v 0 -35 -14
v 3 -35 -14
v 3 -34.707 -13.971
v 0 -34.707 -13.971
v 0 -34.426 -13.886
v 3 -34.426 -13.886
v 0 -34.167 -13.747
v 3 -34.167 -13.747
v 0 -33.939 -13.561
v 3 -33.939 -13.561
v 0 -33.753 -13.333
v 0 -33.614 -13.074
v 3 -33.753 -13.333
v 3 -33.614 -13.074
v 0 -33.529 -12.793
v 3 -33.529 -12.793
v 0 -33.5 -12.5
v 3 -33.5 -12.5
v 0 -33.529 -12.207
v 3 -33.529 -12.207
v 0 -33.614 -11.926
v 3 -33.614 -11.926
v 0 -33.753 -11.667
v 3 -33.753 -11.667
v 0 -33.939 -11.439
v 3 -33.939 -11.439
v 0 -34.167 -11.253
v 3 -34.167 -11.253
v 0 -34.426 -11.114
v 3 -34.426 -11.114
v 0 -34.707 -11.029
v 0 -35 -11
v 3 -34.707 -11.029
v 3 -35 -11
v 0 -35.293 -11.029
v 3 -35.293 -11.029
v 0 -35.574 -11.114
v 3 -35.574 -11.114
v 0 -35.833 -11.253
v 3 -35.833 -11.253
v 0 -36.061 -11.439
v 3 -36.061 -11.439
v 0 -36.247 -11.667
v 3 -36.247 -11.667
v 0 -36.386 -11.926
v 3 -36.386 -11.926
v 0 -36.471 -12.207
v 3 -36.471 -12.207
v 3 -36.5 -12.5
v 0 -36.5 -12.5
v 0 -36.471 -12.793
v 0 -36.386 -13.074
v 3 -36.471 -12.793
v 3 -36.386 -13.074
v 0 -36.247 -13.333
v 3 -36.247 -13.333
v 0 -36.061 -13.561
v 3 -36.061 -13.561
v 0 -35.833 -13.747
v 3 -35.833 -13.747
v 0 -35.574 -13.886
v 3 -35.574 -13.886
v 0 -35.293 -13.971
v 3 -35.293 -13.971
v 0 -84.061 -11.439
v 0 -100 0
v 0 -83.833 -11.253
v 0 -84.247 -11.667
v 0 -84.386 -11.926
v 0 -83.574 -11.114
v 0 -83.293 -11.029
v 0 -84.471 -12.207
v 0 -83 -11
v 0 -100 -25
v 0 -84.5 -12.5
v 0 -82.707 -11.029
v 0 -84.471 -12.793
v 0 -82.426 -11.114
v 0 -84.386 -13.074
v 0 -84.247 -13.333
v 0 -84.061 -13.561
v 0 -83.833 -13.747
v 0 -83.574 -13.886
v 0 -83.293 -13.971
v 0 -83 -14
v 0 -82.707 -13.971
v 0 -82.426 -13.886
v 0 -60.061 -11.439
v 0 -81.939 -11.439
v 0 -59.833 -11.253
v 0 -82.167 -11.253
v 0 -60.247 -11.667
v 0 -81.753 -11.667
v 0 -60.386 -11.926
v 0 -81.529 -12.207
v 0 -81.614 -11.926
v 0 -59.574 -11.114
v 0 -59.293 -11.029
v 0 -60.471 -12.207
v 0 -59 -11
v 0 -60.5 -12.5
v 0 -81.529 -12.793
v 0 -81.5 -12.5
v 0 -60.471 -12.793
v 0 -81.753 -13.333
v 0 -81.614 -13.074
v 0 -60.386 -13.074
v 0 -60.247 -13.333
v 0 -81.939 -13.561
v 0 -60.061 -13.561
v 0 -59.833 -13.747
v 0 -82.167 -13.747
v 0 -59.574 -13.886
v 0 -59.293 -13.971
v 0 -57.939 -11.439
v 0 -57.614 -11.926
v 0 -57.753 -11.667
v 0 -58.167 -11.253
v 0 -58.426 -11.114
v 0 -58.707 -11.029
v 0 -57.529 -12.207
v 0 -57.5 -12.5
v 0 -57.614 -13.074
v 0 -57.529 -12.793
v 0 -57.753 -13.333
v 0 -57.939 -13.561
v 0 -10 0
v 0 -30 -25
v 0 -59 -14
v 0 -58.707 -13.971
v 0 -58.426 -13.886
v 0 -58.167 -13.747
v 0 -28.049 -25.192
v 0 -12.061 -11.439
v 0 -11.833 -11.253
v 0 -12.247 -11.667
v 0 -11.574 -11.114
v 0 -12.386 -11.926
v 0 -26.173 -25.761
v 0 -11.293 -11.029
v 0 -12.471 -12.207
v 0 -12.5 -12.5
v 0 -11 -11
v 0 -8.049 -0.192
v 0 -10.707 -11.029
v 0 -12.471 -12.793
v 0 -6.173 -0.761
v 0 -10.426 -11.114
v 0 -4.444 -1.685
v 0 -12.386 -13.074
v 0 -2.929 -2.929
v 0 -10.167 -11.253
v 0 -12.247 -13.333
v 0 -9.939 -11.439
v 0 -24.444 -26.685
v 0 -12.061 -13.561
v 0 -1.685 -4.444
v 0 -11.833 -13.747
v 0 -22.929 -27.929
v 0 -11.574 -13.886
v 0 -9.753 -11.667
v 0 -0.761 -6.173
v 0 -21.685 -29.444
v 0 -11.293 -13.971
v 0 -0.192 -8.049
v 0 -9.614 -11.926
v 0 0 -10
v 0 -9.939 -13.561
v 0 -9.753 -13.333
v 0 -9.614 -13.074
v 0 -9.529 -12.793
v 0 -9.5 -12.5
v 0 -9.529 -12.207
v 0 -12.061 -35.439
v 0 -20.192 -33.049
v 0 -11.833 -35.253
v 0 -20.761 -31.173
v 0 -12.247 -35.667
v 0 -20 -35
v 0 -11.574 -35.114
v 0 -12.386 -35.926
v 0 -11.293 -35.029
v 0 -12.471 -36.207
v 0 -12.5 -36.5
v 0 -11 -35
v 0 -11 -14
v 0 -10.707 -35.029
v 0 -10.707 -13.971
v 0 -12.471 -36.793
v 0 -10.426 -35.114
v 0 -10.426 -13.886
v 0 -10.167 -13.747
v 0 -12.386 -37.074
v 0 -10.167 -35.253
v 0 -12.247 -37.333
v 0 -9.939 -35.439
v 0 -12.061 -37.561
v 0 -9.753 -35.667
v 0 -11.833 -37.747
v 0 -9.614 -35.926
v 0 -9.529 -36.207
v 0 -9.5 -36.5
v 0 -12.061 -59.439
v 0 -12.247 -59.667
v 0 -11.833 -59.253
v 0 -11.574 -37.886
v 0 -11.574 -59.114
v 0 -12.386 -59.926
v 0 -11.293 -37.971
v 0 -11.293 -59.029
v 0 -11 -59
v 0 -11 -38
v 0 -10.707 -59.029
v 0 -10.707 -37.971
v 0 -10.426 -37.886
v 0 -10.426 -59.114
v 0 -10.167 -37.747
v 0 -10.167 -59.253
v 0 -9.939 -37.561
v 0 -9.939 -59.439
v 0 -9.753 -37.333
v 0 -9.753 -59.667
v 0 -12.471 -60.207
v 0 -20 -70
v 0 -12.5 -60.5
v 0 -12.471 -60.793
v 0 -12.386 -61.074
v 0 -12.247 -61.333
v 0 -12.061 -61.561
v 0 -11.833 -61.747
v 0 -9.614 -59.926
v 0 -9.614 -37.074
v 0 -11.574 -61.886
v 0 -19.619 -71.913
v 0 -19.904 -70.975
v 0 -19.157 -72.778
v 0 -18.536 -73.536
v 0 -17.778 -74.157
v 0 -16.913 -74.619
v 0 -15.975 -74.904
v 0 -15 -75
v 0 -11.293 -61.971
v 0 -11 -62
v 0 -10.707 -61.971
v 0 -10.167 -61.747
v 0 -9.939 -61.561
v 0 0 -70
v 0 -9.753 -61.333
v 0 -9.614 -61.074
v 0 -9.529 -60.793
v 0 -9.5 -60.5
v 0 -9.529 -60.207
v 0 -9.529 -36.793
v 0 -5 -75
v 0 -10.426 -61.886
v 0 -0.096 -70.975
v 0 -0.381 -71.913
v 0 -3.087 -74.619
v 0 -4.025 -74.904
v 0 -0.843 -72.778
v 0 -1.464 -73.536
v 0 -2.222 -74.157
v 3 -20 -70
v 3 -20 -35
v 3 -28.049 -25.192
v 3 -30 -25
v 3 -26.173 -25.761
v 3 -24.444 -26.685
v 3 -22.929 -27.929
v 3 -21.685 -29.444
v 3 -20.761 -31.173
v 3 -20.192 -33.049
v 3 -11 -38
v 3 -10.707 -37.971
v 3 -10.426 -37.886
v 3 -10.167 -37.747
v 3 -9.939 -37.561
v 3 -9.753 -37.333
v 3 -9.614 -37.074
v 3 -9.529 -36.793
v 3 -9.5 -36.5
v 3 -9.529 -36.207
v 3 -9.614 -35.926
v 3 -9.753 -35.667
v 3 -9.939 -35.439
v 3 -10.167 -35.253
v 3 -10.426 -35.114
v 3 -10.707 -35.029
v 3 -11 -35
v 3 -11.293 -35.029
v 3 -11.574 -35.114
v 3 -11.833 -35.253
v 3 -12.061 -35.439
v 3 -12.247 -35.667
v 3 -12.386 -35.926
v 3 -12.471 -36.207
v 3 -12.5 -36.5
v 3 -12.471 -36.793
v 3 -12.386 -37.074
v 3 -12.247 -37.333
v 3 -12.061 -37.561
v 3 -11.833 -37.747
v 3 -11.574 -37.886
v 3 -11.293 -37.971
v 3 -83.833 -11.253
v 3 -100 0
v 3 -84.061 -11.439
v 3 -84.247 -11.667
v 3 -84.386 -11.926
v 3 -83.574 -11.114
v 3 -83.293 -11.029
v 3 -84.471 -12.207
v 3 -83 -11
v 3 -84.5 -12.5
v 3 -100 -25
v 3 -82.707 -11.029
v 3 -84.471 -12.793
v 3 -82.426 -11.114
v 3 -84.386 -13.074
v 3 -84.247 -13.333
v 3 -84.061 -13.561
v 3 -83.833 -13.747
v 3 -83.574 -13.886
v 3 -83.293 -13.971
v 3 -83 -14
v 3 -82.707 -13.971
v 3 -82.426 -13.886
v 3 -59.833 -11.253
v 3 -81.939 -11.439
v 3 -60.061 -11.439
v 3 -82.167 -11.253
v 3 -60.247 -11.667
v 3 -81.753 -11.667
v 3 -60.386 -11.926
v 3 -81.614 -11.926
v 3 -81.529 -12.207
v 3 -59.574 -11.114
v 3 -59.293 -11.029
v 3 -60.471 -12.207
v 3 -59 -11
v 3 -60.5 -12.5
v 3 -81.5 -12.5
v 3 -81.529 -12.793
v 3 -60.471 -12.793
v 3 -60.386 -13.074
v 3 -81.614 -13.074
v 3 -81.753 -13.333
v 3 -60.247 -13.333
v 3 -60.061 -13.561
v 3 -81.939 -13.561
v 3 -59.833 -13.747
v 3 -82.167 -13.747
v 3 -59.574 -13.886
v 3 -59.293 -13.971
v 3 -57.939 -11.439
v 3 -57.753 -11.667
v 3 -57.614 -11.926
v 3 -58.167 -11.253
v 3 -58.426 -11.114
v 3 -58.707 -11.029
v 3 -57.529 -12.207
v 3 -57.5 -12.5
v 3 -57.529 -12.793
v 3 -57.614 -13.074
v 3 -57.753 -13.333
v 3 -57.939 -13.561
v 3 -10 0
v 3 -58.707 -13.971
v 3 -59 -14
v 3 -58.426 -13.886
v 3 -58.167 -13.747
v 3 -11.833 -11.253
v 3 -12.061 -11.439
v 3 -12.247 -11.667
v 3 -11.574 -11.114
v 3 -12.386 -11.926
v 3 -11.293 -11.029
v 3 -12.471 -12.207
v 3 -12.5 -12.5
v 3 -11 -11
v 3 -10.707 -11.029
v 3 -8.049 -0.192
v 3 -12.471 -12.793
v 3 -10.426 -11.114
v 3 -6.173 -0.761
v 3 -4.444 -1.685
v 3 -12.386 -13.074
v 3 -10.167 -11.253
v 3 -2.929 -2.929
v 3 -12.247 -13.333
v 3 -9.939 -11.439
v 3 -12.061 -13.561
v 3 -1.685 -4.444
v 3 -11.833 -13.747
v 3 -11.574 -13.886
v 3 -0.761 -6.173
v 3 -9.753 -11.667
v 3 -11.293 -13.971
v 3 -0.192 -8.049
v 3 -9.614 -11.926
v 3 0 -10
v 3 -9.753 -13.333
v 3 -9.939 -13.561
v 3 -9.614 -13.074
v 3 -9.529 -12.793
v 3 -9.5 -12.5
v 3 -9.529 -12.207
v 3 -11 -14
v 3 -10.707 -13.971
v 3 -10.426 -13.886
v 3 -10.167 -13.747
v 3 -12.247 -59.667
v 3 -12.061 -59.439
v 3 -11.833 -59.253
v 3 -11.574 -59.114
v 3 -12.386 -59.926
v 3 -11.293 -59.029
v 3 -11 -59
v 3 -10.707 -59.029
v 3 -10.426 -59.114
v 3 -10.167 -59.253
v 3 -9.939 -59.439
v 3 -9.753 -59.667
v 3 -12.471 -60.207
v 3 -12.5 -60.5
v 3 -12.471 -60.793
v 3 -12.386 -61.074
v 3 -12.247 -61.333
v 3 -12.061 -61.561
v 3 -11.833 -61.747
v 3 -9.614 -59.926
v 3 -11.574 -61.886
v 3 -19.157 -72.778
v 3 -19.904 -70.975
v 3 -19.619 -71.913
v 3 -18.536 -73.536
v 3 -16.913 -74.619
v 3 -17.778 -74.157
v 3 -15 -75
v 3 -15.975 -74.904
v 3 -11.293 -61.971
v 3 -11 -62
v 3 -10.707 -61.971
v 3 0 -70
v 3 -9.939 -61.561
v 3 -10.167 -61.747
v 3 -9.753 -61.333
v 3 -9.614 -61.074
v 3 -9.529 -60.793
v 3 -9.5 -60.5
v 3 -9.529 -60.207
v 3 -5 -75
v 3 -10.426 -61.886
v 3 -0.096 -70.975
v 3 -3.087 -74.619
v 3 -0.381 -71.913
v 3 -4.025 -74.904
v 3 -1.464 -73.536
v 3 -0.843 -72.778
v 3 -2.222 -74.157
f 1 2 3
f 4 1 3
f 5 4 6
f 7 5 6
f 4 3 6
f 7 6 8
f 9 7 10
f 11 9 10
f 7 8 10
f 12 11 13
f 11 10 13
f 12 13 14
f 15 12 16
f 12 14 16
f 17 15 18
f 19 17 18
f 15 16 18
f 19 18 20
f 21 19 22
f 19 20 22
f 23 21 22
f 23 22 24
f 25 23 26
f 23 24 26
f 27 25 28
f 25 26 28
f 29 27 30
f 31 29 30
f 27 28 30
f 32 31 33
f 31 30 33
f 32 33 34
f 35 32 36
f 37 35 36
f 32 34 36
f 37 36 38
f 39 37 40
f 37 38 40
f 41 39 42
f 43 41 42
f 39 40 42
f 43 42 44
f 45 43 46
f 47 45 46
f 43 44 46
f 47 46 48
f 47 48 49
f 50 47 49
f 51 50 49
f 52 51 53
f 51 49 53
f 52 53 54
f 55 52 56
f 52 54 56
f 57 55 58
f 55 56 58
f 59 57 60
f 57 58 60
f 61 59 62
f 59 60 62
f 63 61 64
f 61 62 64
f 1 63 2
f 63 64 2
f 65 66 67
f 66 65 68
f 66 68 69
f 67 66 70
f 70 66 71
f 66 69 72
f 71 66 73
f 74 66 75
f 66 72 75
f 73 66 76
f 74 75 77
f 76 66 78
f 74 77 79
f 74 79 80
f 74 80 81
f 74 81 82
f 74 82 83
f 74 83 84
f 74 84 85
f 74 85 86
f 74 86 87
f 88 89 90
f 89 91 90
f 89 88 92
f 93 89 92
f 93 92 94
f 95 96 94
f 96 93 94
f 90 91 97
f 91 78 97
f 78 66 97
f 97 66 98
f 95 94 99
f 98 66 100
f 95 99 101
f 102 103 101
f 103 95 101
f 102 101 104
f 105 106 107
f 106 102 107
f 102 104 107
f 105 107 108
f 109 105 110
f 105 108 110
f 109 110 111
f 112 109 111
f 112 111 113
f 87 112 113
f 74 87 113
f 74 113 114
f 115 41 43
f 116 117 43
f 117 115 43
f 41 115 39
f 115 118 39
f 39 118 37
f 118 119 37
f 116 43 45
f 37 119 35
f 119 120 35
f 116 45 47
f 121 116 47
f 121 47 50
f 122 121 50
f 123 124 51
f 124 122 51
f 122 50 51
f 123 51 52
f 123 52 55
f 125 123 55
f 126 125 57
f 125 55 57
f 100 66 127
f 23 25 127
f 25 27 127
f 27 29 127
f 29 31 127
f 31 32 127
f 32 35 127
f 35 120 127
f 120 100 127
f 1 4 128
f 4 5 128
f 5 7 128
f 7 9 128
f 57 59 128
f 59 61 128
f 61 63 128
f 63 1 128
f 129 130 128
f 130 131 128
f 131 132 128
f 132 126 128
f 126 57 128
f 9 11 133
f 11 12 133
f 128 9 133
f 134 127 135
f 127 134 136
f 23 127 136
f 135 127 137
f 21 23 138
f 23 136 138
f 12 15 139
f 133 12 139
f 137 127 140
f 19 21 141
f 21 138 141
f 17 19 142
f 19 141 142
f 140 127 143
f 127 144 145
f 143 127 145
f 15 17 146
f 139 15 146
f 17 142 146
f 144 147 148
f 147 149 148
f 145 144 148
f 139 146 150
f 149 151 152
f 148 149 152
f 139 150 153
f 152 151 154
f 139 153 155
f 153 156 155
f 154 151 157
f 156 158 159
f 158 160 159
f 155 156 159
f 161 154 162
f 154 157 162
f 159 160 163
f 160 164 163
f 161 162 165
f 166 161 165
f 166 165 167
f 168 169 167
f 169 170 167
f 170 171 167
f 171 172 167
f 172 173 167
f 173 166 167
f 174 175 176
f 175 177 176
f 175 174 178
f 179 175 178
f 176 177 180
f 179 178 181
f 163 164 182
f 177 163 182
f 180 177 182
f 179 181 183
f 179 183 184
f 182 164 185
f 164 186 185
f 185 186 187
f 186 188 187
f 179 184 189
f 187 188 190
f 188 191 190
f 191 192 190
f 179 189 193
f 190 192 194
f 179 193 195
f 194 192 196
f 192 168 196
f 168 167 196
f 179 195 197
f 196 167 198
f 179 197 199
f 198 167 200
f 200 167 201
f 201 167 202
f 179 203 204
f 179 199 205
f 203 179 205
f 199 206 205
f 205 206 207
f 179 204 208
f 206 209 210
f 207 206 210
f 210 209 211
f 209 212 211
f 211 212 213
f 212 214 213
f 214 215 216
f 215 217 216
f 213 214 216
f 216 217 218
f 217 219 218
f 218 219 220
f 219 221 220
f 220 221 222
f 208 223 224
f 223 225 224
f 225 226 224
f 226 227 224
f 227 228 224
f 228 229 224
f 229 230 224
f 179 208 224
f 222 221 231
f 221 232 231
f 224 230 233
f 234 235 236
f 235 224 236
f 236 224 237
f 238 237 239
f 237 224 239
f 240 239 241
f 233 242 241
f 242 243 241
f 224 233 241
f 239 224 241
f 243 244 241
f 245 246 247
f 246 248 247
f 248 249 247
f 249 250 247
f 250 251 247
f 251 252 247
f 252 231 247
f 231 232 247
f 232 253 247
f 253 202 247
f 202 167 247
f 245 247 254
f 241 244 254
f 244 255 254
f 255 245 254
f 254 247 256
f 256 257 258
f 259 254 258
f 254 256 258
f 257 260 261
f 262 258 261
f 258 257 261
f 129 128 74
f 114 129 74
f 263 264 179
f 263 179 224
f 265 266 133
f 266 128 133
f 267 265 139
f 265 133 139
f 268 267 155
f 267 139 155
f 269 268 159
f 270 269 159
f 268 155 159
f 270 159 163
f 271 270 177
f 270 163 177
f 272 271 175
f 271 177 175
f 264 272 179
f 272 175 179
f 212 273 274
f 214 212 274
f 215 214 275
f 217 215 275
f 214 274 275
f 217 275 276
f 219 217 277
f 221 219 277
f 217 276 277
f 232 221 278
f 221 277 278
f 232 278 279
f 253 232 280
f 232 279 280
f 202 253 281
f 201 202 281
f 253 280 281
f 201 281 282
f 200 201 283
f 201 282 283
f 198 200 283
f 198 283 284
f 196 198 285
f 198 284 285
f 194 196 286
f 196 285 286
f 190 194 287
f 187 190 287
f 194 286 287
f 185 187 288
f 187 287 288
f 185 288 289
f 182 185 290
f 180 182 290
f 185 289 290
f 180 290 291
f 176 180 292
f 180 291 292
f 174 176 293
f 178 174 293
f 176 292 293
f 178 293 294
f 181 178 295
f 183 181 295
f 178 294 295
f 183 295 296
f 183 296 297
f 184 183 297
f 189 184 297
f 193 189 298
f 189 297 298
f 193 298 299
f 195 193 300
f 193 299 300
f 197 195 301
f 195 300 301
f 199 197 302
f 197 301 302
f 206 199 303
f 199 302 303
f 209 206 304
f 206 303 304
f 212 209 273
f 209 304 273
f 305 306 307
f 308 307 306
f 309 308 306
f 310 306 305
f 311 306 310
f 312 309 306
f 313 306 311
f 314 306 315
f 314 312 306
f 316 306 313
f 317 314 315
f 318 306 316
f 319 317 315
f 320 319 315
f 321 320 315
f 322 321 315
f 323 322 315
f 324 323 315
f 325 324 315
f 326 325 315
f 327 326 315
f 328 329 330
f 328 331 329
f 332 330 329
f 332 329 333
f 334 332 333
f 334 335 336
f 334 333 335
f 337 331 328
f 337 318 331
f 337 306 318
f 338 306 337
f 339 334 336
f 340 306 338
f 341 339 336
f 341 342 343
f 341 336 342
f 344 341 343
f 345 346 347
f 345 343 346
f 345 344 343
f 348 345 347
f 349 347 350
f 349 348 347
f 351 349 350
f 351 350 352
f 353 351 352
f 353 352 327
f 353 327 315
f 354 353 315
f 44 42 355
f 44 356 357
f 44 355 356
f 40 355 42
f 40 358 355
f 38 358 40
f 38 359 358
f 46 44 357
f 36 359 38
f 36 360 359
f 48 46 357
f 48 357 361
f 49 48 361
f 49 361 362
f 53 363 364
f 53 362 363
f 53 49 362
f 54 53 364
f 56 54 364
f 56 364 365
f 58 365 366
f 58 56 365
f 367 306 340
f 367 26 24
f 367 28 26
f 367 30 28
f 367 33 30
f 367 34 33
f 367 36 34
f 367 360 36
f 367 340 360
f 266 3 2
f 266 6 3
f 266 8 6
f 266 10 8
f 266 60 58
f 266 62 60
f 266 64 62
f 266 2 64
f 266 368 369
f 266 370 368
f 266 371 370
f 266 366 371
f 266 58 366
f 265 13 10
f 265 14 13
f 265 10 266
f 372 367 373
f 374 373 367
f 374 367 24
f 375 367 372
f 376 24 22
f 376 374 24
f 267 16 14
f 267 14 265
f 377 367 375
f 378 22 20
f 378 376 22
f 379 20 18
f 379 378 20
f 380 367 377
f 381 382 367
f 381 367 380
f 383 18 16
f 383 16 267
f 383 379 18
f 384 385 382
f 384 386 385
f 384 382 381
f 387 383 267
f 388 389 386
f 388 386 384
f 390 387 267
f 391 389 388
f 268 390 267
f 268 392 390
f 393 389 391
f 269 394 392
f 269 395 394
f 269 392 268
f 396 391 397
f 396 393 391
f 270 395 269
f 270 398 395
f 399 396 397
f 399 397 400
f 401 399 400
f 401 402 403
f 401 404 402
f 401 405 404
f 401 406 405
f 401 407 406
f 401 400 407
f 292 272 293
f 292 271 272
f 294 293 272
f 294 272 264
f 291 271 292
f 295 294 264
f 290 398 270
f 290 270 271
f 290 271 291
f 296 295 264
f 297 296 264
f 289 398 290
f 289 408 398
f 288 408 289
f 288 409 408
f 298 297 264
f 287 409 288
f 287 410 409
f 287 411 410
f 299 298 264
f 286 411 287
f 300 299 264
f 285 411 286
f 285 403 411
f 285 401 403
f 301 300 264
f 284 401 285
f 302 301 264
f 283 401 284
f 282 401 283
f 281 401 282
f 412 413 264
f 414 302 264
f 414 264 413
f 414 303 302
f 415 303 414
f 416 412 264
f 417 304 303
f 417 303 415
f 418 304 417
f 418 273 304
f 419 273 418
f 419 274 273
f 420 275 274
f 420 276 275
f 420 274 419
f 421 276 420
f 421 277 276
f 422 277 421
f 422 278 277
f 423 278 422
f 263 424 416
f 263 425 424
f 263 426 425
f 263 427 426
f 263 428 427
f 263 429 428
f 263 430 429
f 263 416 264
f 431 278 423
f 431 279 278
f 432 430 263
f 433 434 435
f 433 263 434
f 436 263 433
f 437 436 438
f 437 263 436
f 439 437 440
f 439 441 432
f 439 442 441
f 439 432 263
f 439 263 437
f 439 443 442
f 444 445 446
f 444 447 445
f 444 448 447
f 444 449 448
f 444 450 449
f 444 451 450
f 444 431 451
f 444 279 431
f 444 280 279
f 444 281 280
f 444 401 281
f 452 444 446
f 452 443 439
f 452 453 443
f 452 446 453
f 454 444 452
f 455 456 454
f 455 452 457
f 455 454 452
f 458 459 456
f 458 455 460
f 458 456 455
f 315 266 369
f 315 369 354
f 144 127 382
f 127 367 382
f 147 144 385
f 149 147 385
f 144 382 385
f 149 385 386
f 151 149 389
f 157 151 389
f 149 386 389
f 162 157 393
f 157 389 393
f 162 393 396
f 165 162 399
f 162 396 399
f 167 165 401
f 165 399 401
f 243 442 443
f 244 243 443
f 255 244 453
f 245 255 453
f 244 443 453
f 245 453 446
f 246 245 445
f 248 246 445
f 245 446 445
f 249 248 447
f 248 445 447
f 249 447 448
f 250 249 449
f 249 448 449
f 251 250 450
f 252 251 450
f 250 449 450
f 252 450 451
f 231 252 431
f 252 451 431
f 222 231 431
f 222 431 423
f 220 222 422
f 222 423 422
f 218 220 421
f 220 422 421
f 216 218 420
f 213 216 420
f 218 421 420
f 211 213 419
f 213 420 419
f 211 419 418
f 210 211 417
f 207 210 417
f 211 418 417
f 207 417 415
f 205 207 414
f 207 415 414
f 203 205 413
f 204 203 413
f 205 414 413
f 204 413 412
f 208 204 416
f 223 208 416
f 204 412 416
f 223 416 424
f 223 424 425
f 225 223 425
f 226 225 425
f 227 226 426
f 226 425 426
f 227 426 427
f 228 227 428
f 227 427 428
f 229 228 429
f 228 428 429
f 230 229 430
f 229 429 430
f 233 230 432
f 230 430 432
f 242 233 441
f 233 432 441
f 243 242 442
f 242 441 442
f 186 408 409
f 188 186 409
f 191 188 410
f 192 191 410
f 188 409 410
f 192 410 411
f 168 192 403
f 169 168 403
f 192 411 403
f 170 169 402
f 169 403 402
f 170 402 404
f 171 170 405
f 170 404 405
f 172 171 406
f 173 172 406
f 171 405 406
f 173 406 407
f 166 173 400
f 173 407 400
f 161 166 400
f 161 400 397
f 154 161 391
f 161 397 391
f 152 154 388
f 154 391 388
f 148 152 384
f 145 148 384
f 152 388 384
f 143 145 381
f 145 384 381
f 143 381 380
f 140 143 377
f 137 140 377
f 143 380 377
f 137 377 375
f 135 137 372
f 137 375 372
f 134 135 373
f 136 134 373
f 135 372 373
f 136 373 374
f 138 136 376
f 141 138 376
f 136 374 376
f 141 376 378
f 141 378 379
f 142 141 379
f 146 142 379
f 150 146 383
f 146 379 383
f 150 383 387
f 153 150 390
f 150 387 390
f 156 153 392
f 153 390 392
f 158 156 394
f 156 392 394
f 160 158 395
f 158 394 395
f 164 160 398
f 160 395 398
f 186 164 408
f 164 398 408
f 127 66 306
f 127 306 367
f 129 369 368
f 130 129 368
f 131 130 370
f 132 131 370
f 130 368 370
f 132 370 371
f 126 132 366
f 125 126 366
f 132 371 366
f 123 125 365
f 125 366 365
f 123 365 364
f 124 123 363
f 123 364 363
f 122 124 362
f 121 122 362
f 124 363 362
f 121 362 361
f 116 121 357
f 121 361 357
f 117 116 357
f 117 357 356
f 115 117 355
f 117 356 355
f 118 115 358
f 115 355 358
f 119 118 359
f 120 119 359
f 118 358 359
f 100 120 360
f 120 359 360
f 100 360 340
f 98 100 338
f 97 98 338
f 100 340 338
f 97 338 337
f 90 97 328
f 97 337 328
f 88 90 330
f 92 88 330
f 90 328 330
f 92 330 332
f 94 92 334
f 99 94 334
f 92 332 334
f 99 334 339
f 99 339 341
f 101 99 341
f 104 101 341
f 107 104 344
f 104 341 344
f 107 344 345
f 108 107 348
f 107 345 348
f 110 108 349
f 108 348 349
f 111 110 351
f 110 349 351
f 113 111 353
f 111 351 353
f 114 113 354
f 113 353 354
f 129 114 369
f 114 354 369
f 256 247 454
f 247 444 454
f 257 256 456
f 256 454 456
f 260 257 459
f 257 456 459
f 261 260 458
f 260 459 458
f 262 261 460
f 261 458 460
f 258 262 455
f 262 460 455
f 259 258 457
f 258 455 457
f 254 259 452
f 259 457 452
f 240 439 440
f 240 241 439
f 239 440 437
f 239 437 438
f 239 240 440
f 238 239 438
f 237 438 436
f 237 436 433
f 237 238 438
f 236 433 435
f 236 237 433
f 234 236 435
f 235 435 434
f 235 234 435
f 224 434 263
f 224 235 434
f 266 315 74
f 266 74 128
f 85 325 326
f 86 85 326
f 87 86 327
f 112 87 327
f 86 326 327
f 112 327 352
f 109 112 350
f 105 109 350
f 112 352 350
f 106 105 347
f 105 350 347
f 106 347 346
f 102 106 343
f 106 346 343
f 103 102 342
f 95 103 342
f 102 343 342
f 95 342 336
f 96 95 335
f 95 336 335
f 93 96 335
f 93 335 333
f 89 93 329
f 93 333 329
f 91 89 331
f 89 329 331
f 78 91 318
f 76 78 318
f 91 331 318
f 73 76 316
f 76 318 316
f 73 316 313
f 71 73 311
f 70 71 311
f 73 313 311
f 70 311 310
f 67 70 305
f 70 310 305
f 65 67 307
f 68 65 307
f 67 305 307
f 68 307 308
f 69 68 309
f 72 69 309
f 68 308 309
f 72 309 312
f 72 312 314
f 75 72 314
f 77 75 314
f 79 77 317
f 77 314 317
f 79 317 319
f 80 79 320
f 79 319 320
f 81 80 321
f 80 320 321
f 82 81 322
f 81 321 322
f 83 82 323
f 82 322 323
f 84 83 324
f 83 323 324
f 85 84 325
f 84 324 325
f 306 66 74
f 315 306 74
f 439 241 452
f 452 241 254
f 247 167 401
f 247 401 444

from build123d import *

# Parameters (mm, degrees)
CROQUIS1_W              = 75
CROQUIS1_H              = 100
SALIENTE_EXTRUIR1_DEPTH = 3
CROQUIS2_W              = 50
CROQUIS2_H              = 80
CORTAR_EXTRUIR1_DEPTH   = 3
REDONDEO1_R             = 10
REDONDEO3_R             = 5
CROQUIS3_R              = 1.5
CORTAR_EXTRUIR2_DEPTH   = 3


with BuildPart() as part:
    # Croquis1 → Saliente-Extruir1 (new body)
    with BuildSketch(Plane(origin=(0, 0, 0), x_dir=(0, 0, -1), z_dir=(1, 0, 0))):
        with Locations((37.5, -50)):
            Rectangle(CROQUIS1_W, CROQUIS1_H)
    extrude(amount=SALIENTE_EXTRUIR1_DEPTH)

    # Croquis2 → Cortar-Extruir1 (cut)
    with BuildSketch(Plane(origin=(3, 0, 0), x_dir=(0, 0, -1), z_dir=(1, 0, 0))):
        with Locations((50, -60)):
            Rectangle(CROQUIS2_W, CROQUIS2_H)
    extrude(amount=-CORTAR_EXTRUIR1_DEPTH, mode=Mode.SUBTRACT)

    # Redondeo1
    redondeo1_edges = [part.edges().sort_by_distance(p)[0] for p in [
        (1.5, -20, -25),
        (1.5, 0, 0),
    ]]
    fillet(redondeo1_edges, radius=REDONDEO1_R)

    # Redondeo3
    redondeo3_edges = [part.edges().sort_by_distance(p)[0] for p in [
        (1.5, -20, -75),
        (1.5, 0, -75),
    ]]
    fillet(redondeo3_edges, radius=REDONDEO3_R)

    # Croquis3 → Cortar-Extruir2 (cut)
    with BuildSketch(Plane(origin=(3, 0, 0), x_dir=(0, 0, -1), z_dir=(1, 0, 0))):
        with Locations((12.5, -11)):
            Circle(CROQUIS3_R)
        with Locations((12.5, -59)):
            Circle(CROQUIS3_R)
        with Locations((12.5, -83)):
            Circle(CROQUIS3_R)
        with Locations((12.5, -35)):
            Circle(CROQUIS3_R)
        with Locations((36.5, -11)):
            Circle(CROQUIS3_R)
        with Locations((60.5, -11)):
            Circle(CROQUIS3_R)
    extrude(amount=-CORTAR_EXTRUIR2_DEPTH, mode=Mode.SUBTRACT)


solid = part.part
